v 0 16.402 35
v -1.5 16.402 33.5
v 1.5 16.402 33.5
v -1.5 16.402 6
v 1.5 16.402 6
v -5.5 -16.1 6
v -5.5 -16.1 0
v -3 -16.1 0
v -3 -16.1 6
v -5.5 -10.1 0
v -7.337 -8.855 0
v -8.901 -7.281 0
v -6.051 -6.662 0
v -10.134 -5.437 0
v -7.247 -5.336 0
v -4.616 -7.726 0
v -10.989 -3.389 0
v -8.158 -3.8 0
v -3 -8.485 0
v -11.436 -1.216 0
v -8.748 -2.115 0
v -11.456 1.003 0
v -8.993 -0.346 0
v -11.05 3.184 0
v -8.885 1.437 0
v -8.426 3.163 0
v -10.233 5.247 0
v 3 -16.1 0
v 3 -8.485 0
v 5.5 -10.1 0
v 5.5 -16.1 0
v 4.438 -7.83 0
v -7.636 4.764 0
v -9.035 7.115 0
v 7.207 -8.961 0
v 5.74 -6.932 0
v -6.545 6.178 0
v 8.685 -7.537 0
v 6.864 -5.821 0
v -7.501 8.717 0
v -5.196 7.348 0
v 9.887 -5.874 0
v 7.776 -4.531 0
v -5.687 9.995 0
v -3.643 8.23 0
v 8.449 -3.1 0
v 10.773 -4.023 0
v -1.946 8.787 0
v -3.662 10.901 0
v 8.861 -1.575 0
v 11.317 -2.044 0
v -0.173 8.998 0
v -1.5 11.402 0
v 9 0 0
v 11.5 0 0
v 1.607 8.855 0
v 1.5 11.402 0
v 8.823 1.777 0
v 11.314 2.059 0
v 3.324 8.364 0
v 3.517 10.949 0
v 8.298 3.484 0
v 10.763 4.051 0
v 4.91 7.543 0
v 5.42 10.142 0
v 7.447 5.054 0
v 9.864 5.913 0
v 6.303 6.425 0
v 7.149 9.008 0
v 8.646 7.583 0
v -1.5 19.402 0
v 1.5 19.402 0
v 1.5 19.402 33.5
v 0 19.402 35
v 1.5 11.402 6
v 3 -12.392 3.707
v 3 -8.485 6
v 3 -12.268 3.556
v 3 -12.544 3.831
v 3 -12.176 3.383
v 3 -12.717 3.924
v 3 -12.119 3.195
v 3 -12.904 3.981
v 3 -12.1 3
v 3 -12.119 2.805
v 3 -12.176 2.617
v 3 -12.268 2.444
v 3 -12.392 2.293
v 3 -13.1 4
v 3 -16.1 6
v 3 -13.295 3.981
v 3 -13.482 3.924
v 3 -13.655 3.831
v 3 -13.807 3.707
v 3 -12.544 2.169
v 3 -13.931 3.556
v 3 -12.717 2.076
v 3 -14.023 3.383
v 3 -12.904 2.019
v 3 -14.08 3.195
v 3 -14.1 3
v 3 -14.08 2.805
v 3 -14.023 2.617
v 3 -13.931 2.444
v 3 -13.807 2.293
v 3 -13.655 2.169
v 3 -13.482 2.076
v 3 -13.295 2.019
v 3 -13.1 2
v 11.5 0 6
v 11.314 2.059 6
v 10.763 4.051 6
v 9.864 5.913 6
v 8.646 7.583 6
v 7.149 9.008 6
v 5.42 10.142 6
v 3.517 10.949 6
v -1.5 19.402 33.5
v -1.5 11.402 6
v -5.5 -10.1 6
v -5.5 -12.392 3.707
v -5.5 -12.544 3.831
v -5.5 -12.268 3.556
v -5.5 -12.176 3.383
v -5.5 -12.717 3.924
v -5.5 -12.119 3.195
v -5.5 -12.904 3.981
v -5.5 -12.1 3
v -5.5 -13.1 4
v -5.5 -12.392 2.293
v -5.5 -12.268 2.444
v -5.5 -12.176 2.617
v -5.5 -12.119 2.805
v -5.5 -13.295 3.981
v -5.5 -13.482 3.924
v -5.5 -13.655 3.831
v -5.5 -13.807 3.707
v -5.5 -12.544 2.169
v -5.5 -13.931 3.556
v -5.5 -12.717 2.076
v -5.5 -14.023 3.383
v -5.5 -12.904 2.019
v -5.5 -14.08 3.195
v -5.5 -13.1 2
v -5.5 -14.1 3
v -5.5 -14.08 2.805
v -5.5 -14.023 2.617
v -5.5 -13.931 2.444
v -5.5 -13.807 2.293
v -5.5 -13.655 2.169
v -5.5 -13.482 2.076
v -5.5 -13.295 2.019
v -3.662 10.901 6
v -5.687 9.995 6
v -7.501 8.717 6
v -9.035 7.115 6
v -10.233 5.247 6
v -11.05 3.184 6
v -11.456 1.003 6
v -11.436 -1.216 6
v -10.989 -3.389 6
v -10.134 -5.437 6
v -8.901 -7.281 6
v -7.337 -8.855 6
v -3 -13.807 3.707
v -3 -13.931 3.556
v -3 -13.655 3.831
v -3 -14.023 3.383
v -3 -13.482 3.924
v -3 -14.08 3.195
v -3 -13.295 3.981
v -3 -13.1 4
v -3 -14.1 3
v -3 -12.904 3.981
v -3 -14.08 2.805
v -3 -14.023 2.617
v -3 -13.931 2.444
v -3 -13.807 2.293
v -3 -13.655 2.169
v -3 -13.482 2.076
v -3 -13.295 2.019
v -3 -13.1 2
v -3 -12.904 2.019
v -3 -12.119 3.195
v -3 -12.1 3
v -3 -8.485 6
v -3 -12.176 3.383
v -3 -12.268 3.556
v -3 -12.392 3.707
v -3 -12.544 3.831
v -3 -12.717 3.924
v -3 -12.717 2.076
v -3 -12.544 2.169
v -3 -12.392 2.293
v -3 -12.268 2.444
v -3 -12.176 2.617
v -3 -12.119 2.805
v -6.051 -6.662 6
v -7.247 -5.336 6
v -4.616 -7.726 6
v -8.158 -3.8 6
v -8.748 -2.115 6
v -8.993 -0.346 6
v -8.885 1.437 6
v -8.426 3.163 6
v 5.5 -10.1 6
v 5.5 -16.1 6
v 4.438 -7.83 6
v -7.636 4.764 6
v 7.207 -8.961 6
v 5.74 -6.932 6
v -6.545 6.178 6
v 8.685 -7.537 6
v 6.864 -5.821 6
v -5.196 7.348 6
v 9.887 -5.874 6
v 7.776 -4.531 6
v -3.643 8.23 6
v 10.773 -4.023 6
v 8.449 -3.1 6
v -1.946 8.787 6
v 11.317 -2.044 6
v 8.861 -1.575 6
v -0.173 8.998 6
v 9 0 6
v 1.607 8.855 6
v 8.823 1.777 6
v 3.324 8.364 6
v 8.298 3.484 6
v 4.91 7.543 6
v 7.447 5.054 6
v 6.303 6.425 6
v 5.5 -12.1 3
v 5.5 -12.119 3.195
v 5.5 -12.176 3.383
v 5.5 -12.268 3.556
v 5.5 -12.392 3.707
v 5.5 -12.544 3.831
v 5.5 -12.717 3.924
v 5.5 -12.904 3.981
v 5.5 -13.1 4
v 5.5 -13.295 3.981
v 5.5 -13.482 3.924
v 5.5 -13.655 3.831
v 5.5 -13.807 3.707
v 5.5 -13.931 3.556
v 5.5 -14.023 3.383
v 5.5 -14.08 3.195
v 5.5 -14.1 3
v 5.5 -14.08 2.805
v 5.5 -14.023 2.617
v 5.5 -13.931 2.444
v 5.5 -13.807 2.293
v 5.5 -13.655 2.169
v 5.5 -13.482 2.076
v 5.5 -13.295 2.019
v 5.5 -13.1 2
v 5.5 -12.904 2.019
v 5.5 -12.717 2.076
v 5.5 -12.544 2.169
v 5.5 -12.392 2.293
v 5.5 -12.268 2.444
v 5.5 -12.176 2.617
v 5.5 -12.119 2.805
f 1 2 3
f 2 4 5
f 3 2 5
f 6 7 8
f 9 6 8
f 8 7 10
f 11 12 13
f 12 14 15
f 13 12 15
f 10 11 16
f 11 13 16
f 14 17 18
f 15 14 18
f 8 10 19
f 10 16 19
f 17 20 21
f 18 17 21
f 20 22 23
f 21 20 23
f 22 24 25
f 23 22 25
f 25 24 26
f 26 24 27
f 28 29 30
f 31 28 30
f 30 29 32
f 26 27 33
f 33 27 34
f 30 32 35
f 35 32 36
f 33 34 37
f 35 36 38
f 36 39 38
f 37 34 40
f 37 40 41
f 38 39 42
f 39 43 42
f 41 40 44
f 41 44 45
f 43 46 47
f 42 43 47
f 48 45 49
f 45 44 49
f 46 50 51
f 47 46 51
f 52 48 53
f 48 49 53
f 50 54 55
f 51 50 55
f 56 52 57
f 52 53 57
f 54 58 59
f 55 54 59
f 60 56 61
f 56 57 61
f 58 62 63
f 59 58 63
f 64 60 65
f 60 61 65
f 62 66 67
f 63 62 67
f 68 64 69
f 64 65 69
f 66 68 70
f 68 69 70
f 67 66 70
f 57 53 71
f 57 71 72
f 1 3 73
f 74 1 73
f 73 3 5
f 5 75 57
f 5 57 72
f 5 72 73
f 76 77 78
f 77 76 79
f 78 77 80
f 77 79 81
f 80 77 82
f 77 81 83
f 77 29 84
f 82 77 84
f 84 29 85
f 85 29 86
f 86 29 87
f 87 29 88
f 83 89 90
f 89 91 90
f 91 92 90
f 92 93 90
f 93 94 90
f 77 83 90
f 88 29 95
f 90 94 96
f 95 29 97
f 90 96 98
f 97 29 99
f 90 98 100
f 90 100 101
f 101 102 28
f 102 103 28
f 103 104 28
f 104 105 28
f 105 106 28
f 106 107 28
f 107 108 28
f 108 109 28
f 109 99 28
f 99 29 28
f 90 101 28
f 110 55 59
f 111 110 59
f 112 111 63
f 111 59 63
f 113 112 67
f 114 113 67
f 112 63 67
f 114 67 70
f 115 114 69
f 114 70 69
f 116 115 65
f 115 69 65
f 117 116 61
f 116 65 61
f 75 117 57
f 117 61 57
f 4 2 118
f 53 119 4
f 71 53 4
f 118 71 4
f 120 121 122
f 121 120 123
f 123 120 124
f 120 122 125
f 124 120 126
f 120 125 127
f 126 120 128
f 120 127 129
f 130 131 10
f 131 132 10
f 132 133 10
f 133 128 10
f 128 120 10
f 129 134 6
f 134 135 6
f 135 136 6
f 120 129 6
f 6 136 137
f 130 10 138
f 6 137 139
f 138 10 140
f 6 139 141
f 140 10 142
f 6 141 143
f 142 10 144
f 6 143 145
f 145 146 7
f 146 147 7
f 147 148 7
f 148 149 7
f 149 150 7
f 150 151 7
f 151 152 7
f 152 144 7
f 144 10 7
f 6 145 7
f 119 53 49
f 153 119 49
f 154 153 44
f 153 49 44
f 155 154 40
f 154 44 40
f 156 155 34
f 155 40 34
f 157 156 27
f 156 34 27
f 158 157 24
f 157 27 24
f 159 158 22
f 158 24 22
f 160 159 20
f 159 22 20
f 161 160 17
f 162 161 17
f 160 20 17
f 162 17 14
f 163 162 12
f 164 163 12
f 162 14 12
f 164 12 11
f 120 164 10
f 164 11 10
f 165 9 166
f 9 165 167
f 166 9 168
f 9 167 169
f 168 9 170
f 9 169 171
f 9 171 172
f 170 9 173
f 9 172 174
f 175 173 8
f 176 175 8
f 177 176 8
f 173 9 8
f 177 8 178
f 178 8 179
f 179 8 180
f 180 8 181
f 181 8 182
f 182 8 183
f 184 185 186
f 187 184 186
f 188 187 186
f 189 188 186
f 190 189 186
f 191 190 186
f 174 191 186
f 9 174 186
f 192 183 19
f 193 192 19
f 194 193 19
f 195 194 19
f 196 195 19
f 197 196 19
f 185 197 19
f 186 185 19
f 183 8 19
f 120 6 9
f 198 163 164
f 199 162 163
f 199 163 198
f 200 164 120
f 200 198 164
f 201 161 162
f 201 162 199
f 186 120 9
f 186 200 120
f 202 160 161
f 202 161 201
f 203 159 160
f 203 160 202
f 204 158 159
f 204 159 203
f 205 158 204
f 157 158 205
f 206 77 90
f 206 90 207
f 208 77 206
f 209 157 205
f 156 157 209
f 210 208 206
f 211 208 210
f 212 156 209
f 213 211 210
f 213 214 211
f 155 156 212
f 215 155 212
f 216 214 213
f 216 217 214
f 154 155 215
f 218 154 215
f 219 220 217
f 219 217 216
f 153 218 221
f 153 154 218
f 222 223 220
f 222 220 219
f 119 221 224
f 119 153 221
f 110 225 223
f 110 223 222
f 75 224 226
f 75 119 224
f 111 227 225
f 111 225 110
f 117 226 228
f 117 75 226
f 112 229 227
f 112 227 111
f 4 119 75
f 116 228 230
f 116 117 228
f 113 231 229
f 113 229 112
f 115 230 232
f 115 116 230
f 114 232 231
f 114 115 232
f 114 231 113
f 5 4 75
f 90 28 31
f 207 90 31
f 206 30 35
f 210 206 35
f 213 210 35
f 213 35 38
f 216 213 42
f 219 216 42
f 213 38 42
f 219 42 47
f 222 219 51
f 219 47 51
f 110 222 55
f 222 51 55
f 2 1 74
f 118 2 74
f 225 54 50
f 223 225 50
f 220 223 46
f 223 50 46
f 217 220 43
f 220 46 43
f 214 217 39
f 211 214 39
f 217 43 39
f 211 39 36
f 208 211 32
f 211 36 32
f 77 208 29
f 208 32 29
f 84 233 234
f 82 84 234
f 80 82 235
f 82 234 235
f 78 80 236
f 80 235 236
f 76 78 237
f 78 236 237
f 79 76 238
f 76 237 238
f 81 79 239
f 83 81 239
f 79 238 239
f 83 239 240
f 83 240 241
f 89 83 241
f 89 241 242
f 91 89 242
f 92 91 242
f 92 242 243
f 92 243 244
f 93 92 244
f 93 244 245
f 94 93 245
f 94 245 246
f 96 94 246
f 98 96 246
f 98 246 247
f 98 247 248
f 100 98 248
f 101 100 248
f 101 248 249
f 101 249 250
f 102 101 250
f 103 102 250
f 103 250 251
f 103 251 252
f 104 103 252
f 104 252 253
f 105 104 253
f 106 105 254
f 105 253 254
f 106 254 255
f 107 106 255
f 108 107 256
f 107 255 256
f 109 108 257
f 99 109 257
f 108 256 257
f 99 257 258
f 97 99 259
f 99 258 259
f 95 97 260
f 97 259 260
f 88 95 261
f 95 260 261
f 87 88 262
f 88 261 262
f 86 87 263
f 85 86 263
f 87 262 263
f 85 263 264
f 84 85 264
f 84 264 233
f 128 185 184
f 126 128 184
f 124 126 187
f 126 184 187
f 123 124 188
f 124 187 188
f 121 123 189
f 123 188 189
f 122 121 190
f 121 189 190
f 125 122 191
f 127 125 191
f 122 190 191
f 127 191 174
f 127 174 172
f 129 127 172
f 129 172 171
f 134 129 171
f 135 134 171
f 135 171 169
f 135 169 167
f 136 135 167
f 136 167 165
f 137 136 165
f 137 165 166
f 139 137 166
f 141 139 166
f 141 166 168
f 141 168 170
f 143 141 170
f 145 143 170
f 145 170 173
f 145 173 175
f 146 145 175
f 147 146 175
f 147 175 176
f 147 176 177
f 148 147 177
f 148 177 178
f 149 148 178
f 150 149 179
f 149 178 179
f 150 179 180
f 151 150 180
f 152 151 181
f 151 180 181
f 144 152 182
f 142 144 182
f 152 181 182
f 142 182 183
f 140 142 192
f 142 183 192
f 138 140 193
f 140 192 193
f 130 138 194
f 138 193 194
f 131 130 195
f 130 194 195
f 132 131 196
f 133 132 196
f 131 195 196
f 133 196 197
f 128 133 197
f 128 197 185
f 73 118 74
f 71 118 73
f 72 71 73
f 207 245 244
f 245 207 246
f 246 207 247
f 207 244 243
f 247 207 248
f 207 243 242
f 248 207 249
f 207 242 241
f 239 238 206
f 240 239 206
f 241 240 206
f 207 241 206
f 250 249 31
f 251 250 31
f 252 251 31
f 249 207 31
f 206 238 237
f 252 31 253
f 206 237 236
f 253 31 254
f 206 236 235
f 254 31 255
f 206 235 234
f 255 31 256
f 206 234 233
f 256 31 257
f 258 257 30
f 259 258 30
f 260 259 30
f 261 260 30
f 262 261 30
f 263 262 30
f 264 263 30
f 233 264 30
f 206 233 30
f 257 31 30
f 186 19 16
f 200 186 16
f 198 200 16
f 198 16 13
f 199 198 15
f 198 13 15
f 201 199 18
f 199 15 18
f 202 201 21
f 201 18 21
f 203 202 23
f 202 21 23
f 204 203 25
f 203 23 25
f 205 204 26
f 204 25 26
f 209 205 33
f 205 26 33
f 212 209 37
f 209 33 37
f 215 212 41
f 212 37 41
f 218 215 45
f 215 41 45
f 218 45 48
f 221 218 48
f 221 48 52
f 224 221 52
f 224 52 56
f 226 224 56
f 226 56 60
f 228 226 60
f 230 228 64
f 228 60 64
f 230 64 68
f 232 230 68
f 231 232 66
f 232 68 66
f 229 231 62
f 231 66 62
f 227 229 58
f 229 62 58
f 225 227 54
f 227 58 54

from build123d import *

# Parameters (mm, degrees)
F1_DEPTH = 6
F2_W     = 3
F2_H     = 3
F3_DEPTH = 29
F5_D     = 2
F6_SIZE  = 1.49999


# Not quite as in the source:
# - a fillet or chamfer is up to 0.001 mm smaller than in the source, because OpenCascade refuses the exact size


with BuildPart() as f1:
    # F0 (on Top) → F1 (new body)
    with BuildSketch(Plane.XY):
        with BuildLine():
            ThreePointArc((-3, -8.4852813742), (-5.1961524227, 7.3484692283), (9, 0))
            ThreePointArc((9, 0), (7.3484692283, -5.1961524227), (3, -8.4852813742))
            Line((3, -8.4852813742), (3, -11.1018016556))
            ThreePointArc((3, -11.1018016556), (4.2794450198, -10.6740971666), (5.5, -10.0995049384))
            ThreePointArc((5.5, -10.0995049384), (9.8868599666, -5.8736700622), (11.5, 0))
            ThreePointArc((11.5, 0), (8.6458082329, 7.5828754441), (1.5, 11.401754251))
            ThreePointArc((1.5, 11.401754251), (0, 11.5), (-1.5, 11.401754251))
            ThreePointArc((-1.5, 11.401754251), (-11.3060177199, 2.103321972), (-5.5, -10.0995049384))
            ThreePointArc((-5.5, -10.0995049384), (-4.2794450198, -10.6740971666), (-3, -11.1018016556))
            Line((-3, -11.1018016556), (-3, -8.4852813742))
        make_face()
        with BuildLine():
            ThreePointArc((5.5, -10.0995049384), (4.2794450198, -10.6740971666), (3, -11.1018016556))
            Line((3, -11.1018016556), (3, -16.0995049384))
            Line((3, -16.0995049384), (5.5, -16.0995049384))
            Line((5.5, -16.0995049384), (5.5, -10.0995049384))
        make_face()
        with BuildLine():
            Line((-3, -16.0995049384), (-3, -11.1018016556))
            ThreePointArc((-3, -11.1018016556), (-4.2794450198, -10.6740971666), (-5.5, -10.0995049384))
            Line((-5.5, -10.0995049384), (-5.5, -16.0995049384))
            Line((-5.5, -16.0995049384), (-3, -16.0995049384))
        make_face()
        with BuildLine():
            Line((-1.5, 19.401754251), (-1.5, 11.401754251))
            ThreePointArc((-1.5, 11.401754251), (0, 11.5), (1.5, 11.401754251))
            Line((1.5, 11.401754251), (1.5, 19.401754251))
            Line((1.5, 19.401754251), (-1.5, 19.401754251))
        make_face()
    extrude(amount=F1_DEPTH)

    # F2 (on face) → F3 (join)
    with BuildSketch(Plane.XY.offset(6)):
        with Locations((0, 17.901754251)):
            Rectangle(F2_W, F2_H)
    extrude(amount=F3_DEPTH)

    # F5 (through all)
    with Locations(Plane(origin=(-5.5, 0, 0), x_dir=(0, -1, 0), z_dir=(-1, 0, 0))):
        with Locations((13.0995049384, 3)):
            Hole(F5_D / 2)

    # F6 (size 1.5 in the source; OpenCascade refuses exactly that, so slightly less here)
    f6_edges = [f1.edges().sort_by_distance(p)[0] for p in [
        (1.5, 17.901754, 35),
        (-1.5, 17.901754, 35),
    ]]
    chamfer(f6_edges, length=F6_SIZE)


solid = f1.part
